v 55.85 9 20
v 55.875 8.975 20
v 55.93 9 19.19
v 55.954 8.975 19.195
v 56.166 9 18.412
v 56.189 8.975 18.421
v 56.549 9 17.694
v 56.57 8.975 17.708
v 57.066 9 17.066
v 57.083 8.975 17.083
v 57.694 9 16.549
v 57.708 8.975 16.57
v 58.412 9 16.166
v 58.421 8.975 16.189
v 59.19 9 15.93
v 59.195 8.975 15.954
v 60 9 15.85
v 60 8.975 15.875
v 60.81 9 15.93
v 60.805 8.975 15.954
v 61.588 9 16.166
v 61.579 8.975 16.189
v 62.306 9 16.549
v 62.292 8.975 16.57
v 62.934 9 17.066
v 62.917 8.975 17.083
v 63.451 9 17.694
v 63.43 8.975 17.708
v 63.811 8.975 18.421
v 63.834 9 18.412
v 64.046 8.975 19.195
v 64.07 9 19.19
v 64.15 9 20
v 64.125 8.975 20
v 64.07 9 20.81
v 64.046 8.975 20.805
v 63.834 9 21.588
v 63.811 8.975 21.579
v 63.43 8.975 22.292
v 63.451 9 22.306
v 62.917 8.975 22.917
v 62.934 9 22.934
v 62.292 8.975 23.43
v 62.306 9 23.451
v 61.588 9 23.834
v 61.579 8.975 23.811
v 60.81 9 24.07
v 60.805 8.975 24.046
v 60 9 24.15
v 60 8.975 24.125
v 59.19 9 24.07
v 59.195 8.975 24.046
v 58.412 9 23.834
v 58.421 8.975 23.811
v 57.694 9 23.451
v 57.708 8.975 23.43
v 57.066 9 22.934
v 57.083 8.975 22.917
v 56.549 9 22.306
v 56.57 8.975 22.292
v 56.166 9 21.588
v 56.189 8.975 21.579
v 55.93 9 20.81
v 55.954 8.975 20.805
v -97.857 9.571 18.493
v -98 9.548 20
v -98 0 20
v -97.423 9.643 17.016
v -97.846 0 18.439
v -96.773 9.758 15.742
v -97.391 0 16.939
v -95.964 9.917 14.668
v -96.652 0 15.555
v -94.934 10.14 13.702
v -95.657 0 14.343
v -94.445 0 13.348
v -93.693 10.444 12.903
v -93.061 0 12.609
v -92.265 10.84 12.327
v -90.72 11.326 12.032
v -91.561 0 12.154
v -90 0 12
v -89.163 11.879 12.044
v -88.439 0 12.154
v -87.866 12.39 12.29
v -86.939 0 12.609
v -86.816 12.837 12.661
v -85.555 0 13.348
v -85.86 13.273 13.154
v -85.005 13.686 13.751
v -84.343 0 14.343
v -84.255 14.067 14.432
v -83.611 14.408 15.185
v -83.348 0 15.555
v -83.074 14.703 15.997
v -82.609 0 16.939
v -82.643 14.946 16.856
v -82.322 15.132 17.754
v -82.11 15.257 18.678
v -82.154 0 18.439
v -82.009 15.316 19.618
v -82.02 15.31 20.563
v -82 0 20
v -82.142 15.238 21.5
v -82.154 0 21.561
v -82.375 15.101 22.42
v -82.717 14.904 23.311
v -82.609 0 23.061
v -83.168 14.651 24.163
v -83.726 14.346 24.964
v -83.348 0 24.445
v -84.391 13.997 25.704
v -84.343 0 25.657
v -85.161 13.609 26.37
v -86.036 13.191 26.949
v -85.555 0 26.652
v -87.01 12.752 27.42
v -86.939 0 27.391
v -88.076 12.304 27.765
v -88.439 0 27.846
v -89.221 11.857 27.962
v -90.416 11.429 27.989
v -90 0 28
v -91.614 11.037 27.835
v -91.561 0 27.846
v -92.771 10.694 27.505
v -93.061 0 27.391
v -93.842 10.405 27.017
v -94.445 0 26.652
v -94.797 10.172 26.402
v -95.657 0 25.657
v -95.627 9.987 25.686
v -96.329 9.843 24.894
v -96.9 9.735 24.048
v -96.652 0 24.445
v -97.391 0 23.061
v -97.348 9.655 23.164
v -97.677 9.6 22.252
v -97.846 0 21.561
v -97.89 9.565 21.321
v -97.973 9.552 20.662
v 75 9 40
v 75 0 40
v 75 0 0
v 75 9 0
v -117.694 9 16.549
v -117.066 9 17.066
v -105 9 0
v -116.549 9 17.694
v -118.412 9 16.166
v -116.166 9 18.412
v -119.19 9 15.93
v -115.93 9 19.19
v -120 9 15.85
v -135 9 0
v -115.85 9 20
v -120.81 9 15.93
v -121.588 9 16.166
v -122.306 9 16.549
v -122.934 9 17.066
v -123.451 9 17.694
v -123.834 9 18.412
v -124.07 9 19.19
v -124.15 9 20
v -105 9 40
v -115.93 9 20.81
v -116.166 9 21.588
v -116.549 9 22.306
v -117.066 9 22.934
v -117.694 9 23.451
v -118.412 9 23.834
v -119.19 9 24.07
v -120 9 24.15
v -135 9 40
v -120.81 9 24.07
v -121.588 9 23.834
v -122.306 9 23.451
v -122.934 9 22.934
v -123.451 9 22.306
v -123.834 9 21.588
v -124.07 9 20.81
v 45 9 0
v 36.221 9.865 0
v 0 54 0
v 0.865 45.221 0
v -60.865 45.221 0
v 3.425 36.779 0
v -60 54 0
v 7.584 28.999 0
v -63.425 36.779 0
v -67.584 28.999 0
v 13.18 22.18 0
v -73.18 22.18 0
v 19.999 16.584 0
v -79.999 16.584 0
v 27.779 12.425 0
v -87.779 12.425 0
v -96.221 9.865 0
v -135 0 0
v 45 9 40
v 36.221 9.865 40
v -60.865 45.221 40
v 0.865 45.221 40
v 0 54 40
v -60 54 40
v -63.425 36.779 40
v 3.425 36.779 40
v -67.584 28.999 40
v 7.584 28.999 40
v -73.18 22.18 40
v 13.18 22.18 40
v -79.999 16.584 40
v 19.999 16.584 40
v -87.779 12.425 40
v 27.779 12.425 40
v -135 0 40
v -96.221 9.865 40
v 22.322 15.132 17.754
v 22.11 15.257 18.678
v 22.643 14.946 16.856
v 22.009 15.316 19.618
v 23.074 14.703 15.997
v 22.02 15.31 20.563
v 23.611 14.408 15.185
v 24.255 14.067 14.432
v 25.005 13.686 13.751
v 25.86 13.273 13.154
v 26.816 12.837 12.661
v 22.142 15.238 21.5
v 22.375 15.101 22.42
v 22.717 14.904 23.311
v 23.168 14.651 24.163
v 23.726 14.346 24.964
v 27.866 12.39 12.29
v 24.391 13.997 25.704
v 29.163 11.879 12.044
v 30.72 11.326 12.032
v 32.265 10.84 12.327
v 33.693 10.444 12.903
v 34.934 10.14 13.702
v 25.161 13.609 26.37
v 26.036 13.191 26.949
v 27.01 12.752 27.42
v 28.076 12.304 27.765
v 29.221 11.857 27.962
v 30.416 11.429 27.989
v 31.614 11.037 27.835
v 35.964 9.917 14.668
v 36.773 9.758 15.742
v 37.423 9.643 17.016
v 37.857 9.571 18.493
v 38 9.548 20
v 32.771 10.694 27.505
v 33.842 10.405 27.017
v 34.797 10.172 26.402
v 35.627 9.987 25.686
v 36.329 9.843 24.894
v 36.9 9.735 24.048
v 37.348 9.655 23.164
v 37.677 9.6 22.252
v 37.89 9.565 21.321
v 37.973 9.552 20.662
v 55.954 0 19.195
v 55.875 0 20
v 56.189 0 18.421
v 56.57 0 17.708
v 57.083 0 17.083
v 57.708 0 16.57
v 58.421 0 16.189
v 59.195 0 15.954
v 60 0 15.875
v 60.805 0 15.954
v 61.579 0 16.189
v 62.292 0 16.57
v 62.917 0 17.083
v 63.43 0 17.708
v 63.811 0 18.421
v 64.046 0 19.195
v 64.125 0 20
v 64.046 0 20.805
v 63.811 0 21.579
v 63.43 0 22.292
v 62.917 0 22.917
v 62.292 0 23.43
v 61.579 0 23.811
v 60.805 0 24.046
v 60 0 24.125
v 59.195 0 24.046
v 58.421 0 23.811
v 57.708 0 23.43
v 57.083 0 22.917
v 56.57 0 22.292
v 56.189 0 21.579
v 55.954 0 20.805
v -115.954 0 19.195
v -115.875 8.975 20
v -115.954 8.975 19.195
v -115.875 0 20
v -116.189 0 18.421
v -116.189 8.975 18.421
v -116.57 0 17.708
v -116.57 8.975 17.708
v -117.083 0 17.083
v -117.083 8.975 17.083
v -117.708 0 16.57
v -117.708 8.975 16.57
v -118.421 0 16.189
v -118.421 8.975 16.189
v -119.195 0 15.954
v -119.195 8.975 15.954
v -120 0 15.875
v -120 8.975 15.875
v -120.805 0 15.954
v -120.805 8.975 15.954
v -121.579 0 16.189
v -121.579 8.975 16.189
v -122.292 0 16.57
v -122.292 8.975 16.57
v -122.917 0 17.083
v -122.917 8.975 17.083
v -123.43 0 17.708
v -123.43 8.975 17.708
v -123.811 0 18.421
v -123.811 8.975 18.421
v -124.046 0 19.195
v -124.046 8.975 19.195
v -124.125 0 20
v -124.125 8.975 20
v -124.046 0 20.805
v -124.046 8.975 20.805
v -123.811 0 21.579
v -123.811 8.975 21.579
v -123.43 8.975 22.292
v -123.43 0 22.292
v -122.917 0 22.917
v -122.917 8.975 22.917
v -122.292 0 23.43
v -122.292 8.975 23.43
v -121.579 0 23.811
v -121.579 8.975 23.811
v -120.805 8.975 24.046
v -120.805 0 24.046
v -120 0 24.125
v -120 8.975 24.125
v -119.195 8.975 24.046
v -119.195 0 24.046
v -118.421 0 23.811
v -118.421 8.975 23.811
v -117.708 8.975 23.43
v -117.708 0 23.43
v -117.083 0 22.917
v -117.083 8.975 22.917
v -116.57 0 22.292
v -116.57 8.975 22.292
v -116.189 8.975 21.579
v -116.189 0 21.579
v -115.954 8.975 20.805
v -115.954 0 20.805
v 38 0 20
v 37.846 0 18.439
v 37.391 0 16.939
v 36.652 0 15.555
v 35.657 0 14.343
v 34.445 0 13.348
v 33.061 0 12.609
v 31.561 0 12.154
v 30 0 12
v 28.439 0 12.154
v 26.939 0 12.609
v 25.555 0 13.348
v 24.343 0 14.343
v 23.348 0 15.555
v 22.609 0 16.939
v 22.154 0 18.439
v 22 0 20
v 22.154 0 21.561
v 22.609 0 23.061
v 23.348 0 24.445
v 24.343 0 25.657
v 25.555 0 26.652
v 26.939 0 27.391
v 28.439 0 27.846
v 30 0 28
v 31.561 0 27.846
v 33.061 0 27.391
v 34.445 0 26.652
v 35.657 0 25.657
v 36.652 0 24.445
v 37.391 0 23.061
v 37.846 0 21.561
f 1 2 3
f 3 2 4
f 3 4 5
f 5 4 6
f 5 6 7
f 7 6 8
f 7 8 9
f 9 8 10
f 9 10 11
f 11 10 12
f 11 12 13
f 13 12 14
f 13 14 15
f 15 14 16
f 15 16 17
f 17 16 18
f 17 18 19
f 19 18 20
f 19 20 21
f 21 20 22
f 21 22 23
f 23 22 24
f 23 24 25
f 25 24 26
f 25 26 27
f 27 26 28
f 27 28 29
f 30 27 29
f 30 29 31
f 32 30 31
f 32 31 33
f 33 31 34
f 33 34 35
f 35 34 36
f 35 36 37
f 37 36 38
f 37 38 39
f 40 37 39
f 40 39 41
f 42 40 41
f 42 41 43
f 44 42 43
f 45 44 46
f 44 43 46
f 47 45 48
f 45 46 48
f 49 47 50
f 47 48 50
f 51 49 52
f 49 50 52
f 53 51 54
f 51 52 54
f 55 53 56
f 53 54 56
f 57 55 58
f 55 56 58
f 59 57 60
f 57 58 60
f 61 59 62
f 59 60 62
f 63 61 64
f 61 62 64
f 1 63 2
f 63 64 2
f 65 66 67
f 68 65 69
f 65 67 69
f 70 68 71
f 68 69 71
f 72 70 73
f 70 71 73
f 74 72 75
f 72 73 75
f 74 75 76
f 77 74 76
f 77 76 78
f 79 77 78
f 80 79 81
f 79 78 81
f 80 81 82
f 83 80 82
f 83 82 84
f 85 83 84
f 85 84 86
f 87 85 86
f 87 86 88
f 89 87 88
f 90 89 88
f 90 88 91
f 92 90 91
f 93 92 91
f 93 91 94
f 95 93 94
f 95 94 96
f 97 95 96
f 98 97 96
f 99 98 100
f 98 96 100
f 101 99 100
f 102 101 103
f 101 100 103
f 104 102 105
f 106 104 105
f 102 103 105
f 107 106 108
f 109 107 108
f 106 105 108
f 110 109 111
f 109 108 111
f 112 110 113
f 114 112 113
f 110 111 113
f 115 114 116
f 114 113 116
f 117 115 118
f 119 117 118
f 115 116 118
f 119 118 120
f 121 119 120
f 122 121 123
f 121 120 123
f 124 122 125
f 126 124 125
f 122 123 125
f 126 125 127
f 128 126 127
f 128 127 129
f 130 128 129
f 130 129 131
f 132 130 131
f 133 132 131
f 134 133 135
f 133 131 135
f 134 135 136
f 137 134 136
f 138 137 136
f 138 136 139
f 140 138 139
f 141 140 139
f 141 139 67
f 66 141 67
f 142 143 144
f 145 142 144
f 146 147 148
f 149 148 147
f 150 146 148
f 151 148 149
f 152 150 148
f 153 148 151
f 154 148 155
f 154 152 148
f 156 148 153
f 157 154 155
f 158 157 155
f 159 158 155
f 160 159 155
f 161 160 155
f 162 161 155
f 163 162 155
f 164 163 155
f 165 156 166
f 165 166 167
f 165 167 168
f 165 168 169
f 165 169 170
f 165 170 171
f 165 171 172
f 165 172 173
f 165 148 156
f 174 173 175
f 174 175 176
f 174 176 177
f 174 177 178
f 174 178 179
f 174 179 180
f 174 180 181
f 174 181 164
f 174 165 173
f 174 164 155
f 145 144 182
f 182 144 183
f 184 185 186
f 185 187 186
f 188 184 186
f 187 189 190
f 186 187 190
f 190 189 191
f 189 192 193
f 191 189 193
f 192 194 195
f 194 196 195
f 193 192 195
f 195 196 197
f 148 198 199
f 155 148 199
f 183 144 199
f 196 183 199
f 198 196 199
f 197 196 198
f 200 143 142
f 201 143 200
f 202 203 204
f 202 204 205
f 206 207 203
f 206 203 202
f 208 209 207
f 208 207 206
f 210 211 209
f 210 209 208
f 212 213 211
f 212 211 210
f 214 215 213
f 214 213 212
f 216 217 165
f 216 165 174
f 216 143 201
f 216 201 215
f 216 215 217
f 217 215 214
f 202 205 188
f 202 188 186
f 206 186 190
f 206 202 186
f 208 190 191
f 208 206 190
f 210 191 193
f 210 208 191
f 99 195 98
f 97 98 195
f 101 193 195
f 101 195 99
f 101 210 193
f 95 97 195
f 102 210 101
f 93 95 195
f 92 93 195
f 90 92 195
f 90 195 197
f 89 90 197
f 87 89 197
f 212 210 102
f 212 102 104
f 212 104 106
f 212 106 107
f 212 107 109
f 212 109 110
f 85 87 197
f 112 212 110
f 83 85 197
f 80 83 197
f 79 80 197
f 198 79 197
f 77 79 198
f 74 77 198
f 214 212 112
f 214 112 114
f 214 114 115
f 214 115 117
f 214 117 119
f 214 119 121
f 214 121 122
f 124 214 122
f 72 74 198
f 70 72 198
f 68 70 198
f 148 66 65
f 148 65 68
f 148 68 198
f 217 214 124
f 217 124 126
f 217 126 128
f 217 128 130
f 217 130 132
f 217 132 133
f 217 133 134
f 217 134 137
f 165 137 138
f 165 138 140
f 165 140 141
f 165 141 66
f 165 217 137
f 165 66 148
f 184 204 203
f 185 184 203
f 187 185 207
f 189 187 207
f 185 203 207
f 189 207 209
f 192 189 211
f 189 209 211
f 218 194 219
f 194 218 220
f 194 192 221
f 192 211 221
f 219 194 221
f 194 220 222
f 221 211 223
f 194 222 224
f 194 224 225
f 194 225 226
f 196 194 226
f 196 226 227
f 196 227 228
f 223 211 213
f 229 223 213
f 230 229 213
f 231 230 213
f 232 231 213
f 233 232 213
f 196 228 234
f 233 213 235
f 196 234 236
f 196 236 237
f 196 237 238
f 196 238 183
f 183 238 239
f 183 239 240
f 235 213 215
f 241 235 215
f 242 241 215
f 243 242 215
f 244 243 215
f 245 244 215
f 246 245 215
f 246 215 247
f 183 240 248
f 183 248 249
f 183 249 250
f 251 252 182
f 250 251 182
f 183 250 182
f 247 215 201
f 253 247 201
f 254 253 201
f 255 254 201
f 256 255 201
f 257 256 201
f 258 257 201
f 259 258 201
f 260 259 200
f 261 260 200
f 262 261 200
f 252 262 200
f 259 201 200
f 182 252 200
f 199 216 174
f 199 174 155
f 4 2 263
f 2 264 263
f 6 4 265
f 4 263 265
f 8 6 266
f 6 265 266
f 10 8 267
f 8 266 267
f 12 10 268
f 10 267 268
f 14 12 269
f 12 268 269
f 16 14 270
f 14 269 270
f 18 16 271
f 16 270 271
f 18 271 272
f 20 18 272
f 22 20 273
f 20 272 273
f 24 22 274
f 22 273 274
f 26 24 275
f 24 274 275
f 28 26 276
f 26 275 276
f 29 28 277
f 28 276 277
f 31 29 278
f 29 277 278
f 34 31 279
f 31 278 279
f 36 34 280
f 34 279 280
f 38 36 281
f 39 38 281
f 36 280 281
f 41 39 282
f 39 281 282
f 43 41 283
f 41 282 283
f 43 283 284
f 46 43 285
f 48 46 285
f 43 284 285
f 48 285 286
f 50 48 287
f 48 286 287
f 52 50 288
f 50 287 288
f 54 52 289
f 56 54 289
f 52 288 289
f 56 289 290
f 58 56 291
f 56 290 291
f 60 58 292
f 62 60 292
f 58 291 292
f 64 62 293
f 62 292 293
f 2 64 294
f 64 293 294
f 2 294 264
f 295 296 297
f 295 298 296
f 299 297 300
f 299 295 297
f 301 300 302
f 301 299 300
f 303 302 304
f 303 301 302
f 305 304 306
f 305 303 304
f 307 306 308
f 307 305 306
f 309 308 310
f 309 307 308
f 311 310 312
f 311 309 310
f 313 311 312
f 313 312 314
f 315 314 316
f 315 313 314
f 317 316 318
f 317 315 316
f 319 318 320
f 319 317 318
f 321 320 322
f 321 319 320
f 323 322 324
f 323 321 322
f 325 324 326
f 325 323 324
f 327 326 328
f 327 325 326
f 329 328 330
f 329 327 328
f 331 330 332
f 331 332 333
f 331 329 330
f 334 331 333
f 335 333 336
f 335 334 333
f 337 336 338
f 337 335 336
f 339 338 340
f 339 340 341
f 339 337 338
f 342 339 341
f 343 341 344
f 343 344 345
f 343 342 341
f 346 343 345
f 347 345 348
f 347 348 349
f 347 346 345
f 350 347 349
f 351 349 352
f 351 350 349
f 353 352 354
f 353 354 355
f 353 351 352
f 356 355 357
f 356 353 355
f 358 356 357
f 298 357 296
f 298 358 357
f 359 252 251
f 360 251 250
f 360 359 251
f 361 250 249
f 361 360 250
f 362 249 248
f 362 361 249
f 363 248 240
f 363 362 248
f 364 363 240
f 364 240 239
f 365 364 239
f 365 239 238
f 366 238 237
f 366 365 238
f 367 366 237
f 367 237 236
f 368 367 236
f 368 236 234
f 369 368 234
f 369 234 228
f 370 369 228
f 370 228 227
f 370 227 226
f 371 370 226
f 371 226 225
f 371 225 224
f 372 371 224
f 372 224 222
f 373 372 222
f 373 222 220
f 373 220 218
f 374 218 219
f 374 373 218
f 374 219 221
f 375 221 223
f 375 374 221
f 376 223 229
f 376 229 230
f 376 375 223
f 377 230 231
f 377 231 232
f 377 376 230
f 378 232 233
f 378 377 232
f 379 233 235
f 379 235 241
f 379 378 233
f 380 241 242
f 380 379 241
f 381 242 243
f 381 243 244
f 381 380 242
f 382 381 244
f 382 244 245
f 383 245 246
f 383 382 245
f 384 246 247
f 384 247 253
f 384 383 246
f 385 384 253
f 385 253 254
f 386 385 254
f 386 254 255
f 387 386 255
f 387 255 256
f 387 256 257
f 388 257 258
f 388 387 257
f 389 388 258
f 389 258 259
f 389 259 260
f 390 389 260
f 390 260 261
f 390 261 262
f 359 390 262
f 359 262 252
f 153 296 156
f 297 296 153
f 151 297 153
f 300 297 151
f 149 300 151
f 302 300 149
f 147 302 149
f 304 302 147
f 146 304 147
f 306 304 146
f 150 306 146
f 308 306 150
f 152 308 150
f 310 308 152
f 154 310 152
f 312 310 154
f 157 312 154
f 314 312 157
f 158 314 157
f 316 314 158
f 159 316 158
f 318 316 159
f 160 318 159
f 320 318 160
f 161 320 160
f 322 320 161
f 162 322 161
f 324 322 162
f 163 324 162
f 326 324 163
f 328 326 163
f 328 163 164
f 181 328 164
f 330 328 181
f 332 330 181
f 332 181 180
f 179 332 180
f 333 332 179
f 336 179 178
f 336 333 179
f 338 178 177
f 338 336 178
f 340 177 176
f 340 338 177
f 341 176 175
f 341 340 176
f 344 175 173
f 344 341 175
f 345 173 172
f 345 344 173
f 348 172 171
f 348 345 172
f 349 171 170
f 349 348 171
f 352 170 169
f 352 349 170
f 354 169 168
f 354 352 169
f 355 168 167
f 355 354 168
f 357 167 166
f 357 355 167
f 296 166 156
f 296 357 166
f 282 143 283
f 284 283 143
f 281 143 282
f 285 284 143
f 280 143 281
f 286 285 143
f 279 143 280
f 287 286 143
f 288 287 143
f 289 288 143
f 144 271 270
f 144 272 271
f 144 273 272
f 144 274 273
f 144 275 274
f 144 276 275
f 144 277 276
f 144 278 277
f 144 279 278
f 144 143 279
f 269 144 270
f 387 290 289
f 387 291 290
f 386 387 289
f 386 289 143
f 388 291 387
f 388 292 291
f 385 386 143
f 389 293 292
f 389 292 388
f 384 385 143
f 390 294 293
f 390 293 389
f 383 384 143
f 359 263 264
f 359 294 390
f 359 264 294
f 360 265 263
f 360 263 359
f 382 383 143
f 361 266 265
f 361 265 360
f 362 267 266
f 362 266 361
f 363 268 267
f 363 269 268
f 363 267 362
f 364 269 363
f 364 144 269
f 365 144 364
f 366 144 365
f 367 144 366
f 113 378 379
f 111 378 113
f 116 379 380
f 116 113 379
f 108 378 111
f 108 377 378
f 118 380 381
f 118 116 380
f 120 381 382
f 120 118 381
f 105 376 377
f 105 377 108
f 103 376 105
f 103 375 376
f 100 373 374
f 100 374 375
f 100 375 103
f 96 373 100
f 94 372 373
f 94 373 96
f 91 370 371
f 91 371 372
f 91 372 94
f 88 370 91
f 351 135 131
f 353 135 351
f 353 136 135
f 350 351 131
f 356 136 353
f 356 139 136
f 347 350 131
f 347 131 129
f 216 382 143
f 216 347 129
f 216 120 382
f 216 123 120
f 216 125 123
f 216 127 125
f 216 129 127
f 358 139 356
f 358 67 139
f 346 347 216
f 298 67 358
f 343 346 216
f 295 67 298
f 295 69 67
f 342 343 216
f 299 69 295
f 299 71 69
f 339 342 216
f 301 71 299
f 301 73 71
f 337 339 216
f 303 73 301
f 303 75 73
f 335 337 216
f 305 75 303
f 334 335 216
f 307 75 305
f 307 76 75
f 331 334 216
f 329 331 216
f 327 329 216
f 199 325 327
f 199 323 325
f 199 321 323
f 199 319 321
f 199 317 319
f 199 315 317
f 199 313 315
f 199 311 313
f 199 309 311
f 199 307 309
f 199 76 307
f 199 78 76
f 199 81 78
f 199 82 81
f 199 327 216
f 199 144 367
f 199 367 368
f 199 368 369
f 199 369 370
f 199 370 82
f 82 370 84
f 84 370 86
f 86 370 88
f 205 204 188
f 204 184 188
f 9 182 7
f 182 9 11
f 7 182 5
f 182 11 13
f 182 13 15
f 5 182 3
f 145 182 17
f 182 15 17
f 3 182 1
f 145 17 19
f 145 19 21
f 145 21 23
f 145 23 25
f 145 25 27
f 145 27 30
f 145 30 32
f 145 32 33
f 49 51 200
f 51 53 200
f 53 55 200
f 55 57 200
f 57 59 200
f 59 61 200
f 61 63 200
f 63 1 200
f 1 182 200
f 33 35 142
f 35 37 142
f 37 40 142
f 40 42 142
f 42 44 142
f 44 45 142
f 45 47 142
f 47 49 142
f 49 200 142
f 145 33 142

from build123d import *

# Parameters (mm, degrees)
SKETCH1_W                              = 60
SKETCH1_H                              = 40
BOSS_EXTRUDE1_DEPTH                    = 54
SKETCH3_W                              = 75
SKETCH3_H                              = 40
SKETCH3_R                              = 8
BOSS_EXTRUDE2_DEPTH                    = 54
CUT_EXTRUDE2_DEPTH                     = 60
TAP_DRILL_FOR_M8_HELICOIL1_D           = 8.25
TAP_DRILL_FOR_M8_HELICOIL1_CSINK_D     = 8.3
TAP_DRILL_FOR_M8_HELICOIL1_CSINK_ANGLE = 90


with BuildPart() as part:
    # Sketch1 → Boss-Extrude1 (new body)
    with BuildSketch(Plane(origin=(0, 0, 0), x_dir=(1, 0, 0), z_dir=(0, 1, 0))):
        with Locations((-30, -20)):
            Rectangle(SKETCH1_W, SKETCH1_H)
    extrude(amount=BOSS_EXTRUDE1_DEPTH)

    # Sketch3 → Boss-Extrude2 (add)
    with BuildSketch(Plane(origin=(0, 0, 0), x_dir=(1, 0, 0), z_dir=(0, 1, 0))):
        with Locations((37.5, -20)):
            Rectangle(SKETCH3_W, SKETCH3_H)
        with Locations((30, -20)):
            Circle(SKETCH3_R, mode=Mode.SUBTRACT)
    boss_extrude2 = extrude(amount=BOSS_EXTRUDE2_DEPTH)

    # Sketch4 → Cut-Extrude2 (cut)
    with BuildSketch(Plane.XY.offset(40)):
        with BuildLine():
            ThreePointArc((75, 20.458980338), (61.05699404, 11.962243847), (45, 9))
            Line((45, 9), (75, 9))
            Line((75, 9), (75, 20.458980338))
        make_face()
        with BuildLine():
            Line((45, 9), (45, 54))
            Line((45, 54), (0, 54))
            ThreePointArc((0, 54), (13.180194847, 22.180194847), (45, 9))
        make_face()
        with BuildLine():
            Line((75, 54), (45, 54))
            Line((45, 54), (45, 9))
            ThreePointArc((45, 9), (61.05699404, 11.962243847), (75, 20.458980338))
            Line((75, 20.458980338), (75, 54))
        make_face()
    cut_extrude2 = extrude(amount=-CUT_EXTRUDE2_DEPTH, mode=Mode.SUBTRACT)

    # Tap Drill for M8 Helicoil1 (through all)
    with Locations(Plane(origin=(0, 9, 0), x_dir=(1, 0, 0), z_dir=(0, 1, 0))):
        with Locations((60, -20)):
            tap_drill_for_m8_helicoil1 = CounterSinkHole(TAP_DRILL_FOR_M8_HELICOIL1_D / 2, TAP_DRILL_FOR_M8_HELICOIL1_CSINK_D / 2, counter_sink_angle=TAP_DRILL_FOR_M8_HELICOIL1_CSINK_ANGLE)

    # Mirror1: Boss-Extrude2, Cut-Extrude2, Tap Drill for M8 Helicoil1 across plane
    add(boss_extrude2.mirror(Plane(origin=(-30, 0, 0), x_dir=(0, 0, 1), z_dir=(1, 0, 0))))
    add(cut_extrude2.mirror(Plane(origin=(-30, 0, 0), x_dir=(0, 0, 1), z_dir=(1, 0, 0))), mode=Mode.SUBTRACT)
    add(tap_drill_for_m8_helicoil1.mirror(Plane(origin=(-30, 0, 0), x_dir=(0, 0, 1), z_dir=(1, 0, 0))), mode=Mode.SUBTRACT)


solid = part.part
